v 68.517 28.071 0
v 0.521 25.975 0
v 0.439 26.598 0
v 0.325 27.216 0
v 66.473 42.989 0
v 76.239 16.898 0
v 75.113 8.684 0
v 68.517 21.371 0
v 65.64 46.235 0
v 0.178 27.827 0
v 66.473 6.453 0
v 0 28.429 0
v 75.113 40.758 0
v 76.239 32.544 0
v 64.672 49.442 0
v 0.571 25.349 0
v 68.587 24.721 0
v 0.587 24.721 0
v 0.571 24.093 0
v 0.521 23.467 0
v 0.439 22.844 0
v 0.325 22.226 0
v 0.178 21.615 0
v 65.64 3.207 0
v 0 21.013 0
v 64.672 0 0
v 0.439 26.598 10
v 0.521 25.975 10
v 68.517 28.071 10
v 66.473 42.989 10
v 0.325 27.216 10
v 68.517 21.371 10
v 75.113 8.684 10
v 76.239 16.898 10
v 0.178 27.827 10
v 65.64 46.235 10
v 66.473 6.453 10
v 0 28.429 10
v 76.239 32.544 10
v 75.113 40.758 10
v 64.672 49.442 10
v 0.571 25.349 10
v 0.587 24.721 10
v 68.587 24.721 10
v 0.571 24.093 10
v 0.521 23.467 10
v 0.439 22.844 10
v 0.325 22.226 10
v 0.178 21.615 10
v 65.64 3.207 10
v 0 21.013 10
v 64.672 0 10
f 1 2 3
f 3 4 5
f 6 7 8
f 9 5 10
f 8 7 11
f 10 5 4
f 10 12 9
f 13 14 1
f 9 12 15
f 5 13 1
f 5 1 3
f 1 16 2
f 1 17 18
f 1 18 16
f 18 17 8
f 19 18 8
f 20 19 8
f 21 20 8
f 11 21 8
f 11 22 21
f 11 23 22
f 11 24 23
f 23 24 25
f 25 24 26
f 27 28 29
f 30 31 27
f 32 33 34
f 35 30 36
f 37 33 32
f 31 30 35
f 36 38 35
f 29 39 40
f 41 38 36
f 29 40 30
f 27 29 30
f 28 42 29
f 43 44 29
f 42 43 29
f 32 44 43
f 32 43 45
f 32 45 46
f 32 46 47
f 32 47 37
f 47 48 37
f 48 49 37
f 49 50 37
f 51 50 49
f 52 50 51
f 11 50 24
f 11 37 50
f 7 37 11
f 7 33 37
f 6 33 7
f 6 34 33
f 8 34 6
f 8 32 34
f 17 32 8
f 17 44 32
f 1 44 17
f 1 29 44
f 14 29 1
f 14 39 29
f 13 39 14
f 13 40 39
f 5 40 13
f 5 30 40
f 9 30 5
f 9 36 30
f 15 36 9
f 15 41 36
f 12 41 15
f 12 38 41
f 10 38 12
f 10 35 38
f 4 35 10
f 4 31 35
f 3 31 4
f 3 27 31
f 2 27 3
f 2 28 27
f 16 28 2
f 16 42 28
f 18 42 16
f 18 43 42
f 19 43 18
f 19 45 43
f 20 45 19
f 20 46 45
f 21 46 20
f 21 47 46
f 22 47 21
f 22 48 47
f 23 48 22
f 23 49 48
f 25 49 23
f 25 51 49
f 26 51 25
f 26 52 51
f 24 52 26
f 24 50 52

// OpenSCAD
$fn = 32;

// ----------------------------------------------------------------------
// Gear sector: 2 teeth on 36 degrees
// ----------------------------------------------------------------------

// --- parameters (mm) ---
sector_angle = 36;        // sector angle, degrees
root_r = 80;              // root circle radius
tooth_h = 8;              // tooth height over the root circle
teeth = 2;                // number of teeth on the sector
hub_r = 12;               // hub bore radius
plate_t = 10;             // sector thickness, Z
arc_step = 3;             // sampling step of the root/hub arcs, degrees

tip_r = root_r + tooth_h;  // tip circle radius

profile = [[64.672, 0], [65.64, 3.207], [66.473, 6.453], [75.113, 8.684], [76.239, 16.898], [68.517, 21.371], [68.587, 24.721], [68.517, 28.071], [76.239, 32.544], [75.113, 40.758], [66.473, 42.989], [65.64, 46.235], [64.672, 49.442], [0, 28.429], [0.178, 27.827], [0.325, 27.216], [0.439, 26.598], [0.521, 25.975], [0.571, 25.349], [0.587, 24.721], [0.571, 24.093], [0.521, 23.467], [0.439, 22.844], [0.325, 22.226], [0.178, 21.615], [0, 21.013]];  // primary outline, 26 points, counter clockwise

// --- the one profile operation ---
linear_extrude(height = plate_t) polygon(points = profile);
